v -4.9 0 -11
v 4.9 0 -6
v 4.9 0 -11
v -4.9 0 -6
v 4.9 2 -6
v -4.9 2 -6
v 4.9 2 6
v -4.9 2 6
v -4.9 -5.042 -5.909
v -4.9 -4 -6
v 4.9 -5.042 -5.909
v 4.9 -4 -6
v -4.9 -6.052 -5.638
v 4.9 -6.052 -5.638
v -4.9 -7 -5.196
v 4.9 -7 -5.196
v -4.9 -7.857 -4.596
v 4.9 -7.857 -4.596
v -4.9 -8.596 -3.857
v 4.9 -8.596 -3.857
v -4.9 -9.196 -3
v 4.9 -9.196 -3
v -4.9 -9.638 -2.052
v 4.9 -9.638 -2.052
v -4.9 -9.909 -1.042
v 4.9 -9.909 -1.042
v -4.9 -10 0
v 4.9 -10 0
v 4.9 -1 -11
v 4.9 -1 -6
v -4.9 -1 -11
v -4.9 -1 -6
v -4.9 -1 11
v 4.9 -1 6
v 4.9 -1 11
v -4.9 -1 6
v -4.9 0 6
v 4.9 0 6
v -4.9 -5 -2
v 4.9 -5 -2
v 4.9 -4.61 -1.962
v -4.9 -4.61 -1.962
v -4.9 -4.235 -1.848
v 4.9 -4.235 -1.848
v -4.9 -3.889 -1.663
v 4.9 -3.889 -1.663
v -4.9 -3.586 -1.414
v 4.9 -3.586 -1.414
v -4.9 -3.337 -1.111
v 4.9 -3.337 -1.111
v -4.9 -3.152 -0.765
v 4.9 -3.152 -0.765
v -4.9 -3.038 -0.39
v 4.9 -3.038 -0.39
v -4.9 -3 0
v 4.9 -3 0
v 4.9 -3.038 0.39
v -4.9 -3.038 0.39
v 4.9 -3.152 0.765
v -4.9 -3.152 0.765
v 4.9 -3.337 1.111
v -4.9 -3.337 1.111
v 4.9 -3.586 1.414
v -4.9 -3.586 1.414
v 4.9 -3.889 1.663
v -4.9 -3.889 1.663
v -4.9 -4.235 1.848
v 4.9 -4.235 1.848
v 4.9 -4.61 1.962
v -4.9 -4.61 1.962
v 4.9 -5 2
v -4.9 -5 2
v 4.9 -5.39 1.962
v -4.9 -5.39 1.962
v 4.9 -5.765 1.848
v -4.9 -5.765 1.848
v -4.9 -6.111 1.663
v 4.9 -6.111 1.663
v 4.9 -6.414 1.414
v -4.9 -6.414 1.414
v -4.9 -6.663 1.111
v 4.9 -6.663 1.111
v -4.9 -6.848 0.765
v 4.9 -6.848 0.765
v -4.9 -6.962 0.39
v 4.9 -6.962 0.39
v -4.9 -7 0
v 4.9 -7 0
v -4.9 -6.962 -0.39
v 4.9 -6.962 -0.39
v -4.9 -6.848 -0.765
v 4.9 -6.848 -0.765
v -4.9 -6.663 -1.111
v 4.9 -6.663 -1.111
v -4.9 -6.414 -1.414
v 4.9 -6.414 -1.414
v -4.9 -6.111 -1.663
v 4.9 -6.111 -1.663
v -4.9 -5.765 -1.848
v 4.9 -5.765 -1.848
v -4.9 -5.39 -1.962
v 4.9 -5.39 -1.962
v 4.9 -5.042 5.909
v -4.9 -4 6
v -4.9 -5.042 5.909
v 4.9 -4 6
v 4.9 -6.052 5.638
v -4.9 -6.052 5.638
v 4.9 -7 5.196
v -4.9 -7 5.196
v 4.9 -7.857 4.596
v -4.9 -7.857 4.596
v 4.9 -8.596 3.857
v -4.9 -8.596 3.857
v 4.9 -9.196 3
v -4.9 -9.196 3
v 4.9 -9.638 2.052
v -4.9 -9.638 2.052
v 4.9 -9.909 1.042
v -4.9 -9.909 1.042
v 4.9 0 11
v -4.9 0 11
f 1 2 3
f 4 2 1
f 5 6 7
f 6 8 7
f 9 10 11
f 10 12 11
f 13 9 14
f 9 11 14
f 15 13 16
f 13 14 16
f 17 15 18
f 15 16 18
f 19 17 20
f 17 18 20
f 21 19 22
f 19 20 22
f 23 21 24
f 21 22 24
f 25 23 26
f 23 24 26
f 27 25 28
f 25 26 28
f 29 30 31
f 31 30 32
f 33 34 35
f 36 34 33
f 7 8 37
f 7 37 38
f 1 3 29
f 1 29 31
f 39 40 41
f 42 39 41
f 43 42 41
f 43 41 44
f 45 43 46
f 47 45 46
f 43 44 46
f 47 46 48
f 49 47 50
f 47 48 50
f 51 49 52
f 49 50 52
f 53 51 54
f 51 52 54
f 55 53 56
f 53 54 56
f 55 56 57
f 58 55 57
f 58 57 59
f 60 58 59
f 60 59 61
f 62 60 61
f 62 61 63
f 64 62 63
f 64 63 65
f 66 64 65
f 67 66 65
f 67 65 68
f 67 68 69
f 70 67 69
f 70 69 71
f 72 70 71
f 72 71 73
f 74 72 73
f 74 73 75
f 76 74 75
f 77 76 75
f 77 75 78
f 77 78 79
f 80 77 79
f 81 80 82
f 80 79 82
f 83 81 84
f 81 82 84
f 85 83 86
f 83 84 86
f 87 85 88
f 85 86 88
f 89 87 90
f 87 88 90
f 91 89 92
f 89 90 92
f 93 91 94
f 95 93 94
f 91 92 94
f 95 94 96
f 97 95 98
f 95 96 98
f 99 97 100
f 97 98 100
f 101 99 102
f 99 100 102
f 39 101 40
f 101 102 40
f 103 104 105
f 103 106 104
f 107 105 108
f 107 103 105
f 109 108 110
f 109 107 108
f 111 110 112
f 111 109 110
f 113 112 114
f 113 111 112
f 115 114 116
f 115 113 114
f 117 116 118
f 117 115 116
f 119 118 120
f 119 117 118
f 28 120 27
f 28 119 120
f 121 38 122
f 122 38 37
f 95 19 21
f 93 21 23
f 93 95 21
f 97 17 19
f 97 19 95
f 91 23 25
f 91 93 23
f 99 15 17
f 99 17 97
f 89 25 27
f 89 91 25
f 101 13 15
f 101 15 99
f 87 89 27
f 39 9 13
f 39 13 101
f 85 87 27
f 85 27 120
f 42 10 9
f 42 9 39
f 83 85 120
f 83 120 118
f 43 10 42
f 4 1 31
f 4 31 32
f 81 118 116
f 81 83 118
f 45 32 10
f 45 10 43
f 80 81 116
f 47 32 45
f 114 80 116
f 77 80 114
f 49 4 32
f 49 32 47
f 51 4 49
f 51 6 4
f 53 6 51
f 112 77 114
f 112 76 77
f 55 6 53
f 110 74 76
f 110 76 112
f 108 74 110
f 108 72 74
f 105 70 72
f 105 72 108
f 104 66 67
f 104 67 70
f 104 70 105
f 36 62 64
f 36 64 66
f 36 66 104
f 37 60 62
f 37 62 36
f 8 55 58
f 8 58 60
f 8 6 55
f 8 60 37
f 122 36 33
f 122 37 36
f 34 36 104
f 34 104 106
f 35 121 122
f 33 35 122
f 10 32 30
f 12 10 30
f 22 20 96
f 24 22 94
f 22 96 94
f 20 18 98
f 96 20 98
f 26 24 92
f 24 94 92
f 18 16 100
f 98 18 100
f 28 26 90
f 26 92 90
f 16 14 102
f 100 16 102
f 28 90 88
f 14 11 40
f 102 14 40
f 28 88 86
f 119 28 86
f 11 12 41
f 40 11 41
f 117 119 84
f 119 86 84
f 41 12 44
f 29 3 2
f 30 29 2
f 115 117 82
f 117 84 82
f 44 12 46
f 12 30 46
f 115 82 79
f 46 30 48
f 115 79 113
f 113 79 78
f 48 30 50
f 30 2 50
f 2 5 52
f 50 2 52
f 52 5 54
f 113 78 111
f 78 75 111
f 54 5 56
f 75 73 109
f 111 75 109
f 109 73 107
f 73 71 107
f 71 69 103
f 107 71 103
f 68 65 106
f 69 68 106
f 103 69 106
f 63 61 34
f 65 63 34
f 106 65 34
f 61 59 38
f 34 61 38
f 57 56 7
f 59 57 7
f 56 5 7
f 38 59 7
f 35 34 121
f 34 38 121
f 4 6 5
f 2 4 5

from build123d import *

# Parameters (mm, degrees)
SKETCH1_W                    = 99
SKETCH1_H                    = 25
SKETCH1_W_2                  = 93
SKETCH1_H_2                  = 19
BOSS_EXTRUDE1_DEPTH          = 10
SKETCH2_R                    = 40
CUT_EXTRUDE1_DEPTH           = 8
SKETCH5_W                    = 10
SKETCH5_H                    = 25
BOSS_EXTRUDE5_DEPTH          = 2
SKETCH6_W                    = 6
SKETCH6_H                    = 19
BOSS_EXTRUDE6_DEPTH          = 2
SKETCH7_W                    = 8
SKETCH7_H                    = 3
BOSS_EXTRUDE7_DEPTH          = 30
FILLET5_R                    = 3
FILLET7_R                    = 5
FILLET8_R                    = 20
FILLET9_R                    = 1.5
FILLET10_R                   = 6
FILLET11_R                   = 3
SKETCH8_W                    = 20
SKETCH8_H                    = 25
BOSS_EXTRUDE8_DEPTH          = 2
SKETCH9_W                    = 9.8
SKETCH9_H                    = 12
BOSS_EXTRUDE9_DEPTH          = 10
SKETCH10_R                   = 2
CUT_EXTRUDE2_DEPTH           = 23
FILLET12_R                   = 6
CUT_EXTRUDE_THIN1_DEPTH      = 65.857536204
CUT_EXTRUDE_THIN1_DEPTH_BACK = 65.857536204
SKETCH11_W                   = 109.8
SKETCH11_H                   = 112
SKETCH11_W_2                 = 9.8
SKETCH11_H_2                 = 12
SKETCH12_W                   = 9.8
SKETCH12_H                   = 1
BOSS_EXTRUDE10_DEPTH         = 5


with BuildPart() as part:
    # Sketch1 → Boss-Extrude1 (new body)
    with BuildSketch(Plane(origin=(0, 0, 0), x_dir=(1, 0, 0), z_dir=(0, 1, 0))):
        Rectangle(SKETCH1_W, SKETCH1_H)
        Rectangle(SKETCH1_W_2, SKETCH1_H_2, mode=Mode.SUBTRACT)
    extrude(amount=BOSS_EXTRUDE1_DEPTH)

    # Sketch2 → Cut-Extrude1 (cut)
    with BuildSketch(Plane.XY.offset(12.5)):
        with Locations((21.780912994, 42.853113242)):
            Circle(SKETCH2_R)
    extrude(amount=-CUT_EXTRUDE1_DEPTH, mode=Mode.SUBTRACT)

    # Sketch5 → Boss-Extrude5 (add)
    with BuildSketch(Plane.XZ):
        with Locations((-29.5, 0)):
            Rectangle(SKETCH5_W, SKETCH5_H)
    extrude(amount=-BOSS_EXTRUDE5_DEPTH)

    # Sketch6 → Boss-Extrude6 (add)
    with BuildSketch(Plane.XZ):
        with Locations((43.5, 0)):
            Rectangle(SKETCH6_W, SKETCH6_H)
    extrude(amount=-BOSS_EXTRUDE6_DEPTH)

    # Sketch7 → Boss-Extrude7 (add)
    with BuildSketch(Plane(origin=(0, 10, 0), x_dir=(1, 0, 0), z_dir=(0, 1, 0))):
        with Locations((-32.5, -11)):
            Rectangle(SKETCH7_W, SKETCH7_H)
    extrude(amount=BOSS_EXTRUDE7_DEPTH)

    # Fillet5
    fillet5_edges = [part.edges().sort_by_distance(p)[0] for p in [
        (-34.5, 1, 9.5),
        (-24.5, 1, 9.5),
        (-24.5, 1, -9.5),
        (-34.5, 1, -9.5),
        (40.5, 1, -9.5),
        (40.5, 1, 9.5),
    ]]
    fillet(fillet5_edges, radius=FILLET5_R)

    # Fillet7
    fillet7_edges = [part.edges().sort_by_distance(p)[0] for p in [
        (44.599172136, 10, 11),
    ]]
    fillet(fillet7_edges, radius=FILLET7_R)

    # Fillet8
    fillet8_edges = [part.edges().sort_by_distance(p)[0] for p in [
        (-1.037346149, 10, 11),
    ]]
    fillet(fillet8_edges, radius=FILLET8_R)

    # Fillet9
    fillet9_edges = [part.edges().sort_by_distance(p)[0] for p in [
        (46.5, 6, 9.5),
        (46.5, 6, -9.5),
        (-46.5, 5, -9.5),
        (-46.5, 5, 9.5),
        (-49.5, 5, 12.5),
        (-49.5, 5, -12.5),
        (49.5, 5, -12.5),
        (49.5, 5, 12.5),
    ]]
    fillet(fillet9_edges, radius=FILLET9_R)

    # Fillet10
    fillet10_edges = [part.edges().sort_by_distance(p)[0] for p in [
        (-36.5, 10, 11),
        (-28.5, 10, 11),
    ]]
    fillet(fillet10_edges, radius=FILLET10_R)

    # Fillet11
    fillet11_edges = [part.edges().sort_by_distance(p)[0] for p in [
        (-36.5, 40, 11),
        (-28.5, 40, 11),
    ]]
    fillet(fillet11_edges, radius=FILLET11_R)

    # Sketch8 → Boss-Extrude8 (add)
    with BuildSketch(Plane.XZ):
        Rectangle(SKETCH8_W, SKETCH8_H)
    extrude(amount=-BOSS_EXTRUDE8_DEPTH)

    # Sketch9 → Boss-Extrude9 (add)
    with BuildSketch(Plane.XZ):
        Rectangle(SKETCH9_W, SKETCH9_H)
    extrude(amount=BOSS_EXTRUDE9_DEPTH)

    # Sketch10 → Cut-Extrude2 (cut)
    with BuildSketch(Plane(origin=(4.9, 0, 0), x_dir=(0, 0, -1), z_dir=(1, 0, 0))):
        with Locations((0, -5)):
            Circle(SKETCH10_R)
    extrude(amount=-CUT_EXTRUDE2_DEPTH, mode=Mode.SUBTRACT)

    # Fillet12
    fillet12_edges = [part.edges().sort_by_distance(p)[0] for p in [
        (0, -10, 6),
        (0, -10, -6),
    ]]
    fillet(fillet12_edges, radius=FILLET12_R - 0.0001)  # a hair under: the kernel refuses the full size

    # Sketch11 → Cut-Extrude-Thin1 (cut, two sides: drawn at the far end of the back side and taken through both)
    with BuildSketch(Plane.XZ.offset(-CUT_EXTRUDE_THIN1_DEPTH_BACK)):
        Rectangle(SKETCH11_W, SKETCH11_H)
        Rectangle(SKETCH11_W_2, SKETCH11_H_2, mode=Mode.SUBTRACT)
    extrude(amount=CUT_EXTRUDE_THIN1_DEPTH + CUT_EXTRUDE_THIN1_DEPTH_BACK, mode=Mode.SUBTRACT)

    # Sketch12 → Boss-Extrude10 (add)
    with BuildSketch(Plane(origin=(0, 0, -6), x_dir=(-1, 0, 0), z_dir=(0, 0, -1))):
        with Locations((0, -0.5)):
            Rectangle(SKETCH12_W, SKETCH12_H)
    boss_extrude10 = extrude(amount=BOSS_EXTRUDE10_DEPTH)

    # Mirror1: Boss-Extrude10 across plane
    add(boss_extrude10.mirror(Plane.XY))


solid = part.part
